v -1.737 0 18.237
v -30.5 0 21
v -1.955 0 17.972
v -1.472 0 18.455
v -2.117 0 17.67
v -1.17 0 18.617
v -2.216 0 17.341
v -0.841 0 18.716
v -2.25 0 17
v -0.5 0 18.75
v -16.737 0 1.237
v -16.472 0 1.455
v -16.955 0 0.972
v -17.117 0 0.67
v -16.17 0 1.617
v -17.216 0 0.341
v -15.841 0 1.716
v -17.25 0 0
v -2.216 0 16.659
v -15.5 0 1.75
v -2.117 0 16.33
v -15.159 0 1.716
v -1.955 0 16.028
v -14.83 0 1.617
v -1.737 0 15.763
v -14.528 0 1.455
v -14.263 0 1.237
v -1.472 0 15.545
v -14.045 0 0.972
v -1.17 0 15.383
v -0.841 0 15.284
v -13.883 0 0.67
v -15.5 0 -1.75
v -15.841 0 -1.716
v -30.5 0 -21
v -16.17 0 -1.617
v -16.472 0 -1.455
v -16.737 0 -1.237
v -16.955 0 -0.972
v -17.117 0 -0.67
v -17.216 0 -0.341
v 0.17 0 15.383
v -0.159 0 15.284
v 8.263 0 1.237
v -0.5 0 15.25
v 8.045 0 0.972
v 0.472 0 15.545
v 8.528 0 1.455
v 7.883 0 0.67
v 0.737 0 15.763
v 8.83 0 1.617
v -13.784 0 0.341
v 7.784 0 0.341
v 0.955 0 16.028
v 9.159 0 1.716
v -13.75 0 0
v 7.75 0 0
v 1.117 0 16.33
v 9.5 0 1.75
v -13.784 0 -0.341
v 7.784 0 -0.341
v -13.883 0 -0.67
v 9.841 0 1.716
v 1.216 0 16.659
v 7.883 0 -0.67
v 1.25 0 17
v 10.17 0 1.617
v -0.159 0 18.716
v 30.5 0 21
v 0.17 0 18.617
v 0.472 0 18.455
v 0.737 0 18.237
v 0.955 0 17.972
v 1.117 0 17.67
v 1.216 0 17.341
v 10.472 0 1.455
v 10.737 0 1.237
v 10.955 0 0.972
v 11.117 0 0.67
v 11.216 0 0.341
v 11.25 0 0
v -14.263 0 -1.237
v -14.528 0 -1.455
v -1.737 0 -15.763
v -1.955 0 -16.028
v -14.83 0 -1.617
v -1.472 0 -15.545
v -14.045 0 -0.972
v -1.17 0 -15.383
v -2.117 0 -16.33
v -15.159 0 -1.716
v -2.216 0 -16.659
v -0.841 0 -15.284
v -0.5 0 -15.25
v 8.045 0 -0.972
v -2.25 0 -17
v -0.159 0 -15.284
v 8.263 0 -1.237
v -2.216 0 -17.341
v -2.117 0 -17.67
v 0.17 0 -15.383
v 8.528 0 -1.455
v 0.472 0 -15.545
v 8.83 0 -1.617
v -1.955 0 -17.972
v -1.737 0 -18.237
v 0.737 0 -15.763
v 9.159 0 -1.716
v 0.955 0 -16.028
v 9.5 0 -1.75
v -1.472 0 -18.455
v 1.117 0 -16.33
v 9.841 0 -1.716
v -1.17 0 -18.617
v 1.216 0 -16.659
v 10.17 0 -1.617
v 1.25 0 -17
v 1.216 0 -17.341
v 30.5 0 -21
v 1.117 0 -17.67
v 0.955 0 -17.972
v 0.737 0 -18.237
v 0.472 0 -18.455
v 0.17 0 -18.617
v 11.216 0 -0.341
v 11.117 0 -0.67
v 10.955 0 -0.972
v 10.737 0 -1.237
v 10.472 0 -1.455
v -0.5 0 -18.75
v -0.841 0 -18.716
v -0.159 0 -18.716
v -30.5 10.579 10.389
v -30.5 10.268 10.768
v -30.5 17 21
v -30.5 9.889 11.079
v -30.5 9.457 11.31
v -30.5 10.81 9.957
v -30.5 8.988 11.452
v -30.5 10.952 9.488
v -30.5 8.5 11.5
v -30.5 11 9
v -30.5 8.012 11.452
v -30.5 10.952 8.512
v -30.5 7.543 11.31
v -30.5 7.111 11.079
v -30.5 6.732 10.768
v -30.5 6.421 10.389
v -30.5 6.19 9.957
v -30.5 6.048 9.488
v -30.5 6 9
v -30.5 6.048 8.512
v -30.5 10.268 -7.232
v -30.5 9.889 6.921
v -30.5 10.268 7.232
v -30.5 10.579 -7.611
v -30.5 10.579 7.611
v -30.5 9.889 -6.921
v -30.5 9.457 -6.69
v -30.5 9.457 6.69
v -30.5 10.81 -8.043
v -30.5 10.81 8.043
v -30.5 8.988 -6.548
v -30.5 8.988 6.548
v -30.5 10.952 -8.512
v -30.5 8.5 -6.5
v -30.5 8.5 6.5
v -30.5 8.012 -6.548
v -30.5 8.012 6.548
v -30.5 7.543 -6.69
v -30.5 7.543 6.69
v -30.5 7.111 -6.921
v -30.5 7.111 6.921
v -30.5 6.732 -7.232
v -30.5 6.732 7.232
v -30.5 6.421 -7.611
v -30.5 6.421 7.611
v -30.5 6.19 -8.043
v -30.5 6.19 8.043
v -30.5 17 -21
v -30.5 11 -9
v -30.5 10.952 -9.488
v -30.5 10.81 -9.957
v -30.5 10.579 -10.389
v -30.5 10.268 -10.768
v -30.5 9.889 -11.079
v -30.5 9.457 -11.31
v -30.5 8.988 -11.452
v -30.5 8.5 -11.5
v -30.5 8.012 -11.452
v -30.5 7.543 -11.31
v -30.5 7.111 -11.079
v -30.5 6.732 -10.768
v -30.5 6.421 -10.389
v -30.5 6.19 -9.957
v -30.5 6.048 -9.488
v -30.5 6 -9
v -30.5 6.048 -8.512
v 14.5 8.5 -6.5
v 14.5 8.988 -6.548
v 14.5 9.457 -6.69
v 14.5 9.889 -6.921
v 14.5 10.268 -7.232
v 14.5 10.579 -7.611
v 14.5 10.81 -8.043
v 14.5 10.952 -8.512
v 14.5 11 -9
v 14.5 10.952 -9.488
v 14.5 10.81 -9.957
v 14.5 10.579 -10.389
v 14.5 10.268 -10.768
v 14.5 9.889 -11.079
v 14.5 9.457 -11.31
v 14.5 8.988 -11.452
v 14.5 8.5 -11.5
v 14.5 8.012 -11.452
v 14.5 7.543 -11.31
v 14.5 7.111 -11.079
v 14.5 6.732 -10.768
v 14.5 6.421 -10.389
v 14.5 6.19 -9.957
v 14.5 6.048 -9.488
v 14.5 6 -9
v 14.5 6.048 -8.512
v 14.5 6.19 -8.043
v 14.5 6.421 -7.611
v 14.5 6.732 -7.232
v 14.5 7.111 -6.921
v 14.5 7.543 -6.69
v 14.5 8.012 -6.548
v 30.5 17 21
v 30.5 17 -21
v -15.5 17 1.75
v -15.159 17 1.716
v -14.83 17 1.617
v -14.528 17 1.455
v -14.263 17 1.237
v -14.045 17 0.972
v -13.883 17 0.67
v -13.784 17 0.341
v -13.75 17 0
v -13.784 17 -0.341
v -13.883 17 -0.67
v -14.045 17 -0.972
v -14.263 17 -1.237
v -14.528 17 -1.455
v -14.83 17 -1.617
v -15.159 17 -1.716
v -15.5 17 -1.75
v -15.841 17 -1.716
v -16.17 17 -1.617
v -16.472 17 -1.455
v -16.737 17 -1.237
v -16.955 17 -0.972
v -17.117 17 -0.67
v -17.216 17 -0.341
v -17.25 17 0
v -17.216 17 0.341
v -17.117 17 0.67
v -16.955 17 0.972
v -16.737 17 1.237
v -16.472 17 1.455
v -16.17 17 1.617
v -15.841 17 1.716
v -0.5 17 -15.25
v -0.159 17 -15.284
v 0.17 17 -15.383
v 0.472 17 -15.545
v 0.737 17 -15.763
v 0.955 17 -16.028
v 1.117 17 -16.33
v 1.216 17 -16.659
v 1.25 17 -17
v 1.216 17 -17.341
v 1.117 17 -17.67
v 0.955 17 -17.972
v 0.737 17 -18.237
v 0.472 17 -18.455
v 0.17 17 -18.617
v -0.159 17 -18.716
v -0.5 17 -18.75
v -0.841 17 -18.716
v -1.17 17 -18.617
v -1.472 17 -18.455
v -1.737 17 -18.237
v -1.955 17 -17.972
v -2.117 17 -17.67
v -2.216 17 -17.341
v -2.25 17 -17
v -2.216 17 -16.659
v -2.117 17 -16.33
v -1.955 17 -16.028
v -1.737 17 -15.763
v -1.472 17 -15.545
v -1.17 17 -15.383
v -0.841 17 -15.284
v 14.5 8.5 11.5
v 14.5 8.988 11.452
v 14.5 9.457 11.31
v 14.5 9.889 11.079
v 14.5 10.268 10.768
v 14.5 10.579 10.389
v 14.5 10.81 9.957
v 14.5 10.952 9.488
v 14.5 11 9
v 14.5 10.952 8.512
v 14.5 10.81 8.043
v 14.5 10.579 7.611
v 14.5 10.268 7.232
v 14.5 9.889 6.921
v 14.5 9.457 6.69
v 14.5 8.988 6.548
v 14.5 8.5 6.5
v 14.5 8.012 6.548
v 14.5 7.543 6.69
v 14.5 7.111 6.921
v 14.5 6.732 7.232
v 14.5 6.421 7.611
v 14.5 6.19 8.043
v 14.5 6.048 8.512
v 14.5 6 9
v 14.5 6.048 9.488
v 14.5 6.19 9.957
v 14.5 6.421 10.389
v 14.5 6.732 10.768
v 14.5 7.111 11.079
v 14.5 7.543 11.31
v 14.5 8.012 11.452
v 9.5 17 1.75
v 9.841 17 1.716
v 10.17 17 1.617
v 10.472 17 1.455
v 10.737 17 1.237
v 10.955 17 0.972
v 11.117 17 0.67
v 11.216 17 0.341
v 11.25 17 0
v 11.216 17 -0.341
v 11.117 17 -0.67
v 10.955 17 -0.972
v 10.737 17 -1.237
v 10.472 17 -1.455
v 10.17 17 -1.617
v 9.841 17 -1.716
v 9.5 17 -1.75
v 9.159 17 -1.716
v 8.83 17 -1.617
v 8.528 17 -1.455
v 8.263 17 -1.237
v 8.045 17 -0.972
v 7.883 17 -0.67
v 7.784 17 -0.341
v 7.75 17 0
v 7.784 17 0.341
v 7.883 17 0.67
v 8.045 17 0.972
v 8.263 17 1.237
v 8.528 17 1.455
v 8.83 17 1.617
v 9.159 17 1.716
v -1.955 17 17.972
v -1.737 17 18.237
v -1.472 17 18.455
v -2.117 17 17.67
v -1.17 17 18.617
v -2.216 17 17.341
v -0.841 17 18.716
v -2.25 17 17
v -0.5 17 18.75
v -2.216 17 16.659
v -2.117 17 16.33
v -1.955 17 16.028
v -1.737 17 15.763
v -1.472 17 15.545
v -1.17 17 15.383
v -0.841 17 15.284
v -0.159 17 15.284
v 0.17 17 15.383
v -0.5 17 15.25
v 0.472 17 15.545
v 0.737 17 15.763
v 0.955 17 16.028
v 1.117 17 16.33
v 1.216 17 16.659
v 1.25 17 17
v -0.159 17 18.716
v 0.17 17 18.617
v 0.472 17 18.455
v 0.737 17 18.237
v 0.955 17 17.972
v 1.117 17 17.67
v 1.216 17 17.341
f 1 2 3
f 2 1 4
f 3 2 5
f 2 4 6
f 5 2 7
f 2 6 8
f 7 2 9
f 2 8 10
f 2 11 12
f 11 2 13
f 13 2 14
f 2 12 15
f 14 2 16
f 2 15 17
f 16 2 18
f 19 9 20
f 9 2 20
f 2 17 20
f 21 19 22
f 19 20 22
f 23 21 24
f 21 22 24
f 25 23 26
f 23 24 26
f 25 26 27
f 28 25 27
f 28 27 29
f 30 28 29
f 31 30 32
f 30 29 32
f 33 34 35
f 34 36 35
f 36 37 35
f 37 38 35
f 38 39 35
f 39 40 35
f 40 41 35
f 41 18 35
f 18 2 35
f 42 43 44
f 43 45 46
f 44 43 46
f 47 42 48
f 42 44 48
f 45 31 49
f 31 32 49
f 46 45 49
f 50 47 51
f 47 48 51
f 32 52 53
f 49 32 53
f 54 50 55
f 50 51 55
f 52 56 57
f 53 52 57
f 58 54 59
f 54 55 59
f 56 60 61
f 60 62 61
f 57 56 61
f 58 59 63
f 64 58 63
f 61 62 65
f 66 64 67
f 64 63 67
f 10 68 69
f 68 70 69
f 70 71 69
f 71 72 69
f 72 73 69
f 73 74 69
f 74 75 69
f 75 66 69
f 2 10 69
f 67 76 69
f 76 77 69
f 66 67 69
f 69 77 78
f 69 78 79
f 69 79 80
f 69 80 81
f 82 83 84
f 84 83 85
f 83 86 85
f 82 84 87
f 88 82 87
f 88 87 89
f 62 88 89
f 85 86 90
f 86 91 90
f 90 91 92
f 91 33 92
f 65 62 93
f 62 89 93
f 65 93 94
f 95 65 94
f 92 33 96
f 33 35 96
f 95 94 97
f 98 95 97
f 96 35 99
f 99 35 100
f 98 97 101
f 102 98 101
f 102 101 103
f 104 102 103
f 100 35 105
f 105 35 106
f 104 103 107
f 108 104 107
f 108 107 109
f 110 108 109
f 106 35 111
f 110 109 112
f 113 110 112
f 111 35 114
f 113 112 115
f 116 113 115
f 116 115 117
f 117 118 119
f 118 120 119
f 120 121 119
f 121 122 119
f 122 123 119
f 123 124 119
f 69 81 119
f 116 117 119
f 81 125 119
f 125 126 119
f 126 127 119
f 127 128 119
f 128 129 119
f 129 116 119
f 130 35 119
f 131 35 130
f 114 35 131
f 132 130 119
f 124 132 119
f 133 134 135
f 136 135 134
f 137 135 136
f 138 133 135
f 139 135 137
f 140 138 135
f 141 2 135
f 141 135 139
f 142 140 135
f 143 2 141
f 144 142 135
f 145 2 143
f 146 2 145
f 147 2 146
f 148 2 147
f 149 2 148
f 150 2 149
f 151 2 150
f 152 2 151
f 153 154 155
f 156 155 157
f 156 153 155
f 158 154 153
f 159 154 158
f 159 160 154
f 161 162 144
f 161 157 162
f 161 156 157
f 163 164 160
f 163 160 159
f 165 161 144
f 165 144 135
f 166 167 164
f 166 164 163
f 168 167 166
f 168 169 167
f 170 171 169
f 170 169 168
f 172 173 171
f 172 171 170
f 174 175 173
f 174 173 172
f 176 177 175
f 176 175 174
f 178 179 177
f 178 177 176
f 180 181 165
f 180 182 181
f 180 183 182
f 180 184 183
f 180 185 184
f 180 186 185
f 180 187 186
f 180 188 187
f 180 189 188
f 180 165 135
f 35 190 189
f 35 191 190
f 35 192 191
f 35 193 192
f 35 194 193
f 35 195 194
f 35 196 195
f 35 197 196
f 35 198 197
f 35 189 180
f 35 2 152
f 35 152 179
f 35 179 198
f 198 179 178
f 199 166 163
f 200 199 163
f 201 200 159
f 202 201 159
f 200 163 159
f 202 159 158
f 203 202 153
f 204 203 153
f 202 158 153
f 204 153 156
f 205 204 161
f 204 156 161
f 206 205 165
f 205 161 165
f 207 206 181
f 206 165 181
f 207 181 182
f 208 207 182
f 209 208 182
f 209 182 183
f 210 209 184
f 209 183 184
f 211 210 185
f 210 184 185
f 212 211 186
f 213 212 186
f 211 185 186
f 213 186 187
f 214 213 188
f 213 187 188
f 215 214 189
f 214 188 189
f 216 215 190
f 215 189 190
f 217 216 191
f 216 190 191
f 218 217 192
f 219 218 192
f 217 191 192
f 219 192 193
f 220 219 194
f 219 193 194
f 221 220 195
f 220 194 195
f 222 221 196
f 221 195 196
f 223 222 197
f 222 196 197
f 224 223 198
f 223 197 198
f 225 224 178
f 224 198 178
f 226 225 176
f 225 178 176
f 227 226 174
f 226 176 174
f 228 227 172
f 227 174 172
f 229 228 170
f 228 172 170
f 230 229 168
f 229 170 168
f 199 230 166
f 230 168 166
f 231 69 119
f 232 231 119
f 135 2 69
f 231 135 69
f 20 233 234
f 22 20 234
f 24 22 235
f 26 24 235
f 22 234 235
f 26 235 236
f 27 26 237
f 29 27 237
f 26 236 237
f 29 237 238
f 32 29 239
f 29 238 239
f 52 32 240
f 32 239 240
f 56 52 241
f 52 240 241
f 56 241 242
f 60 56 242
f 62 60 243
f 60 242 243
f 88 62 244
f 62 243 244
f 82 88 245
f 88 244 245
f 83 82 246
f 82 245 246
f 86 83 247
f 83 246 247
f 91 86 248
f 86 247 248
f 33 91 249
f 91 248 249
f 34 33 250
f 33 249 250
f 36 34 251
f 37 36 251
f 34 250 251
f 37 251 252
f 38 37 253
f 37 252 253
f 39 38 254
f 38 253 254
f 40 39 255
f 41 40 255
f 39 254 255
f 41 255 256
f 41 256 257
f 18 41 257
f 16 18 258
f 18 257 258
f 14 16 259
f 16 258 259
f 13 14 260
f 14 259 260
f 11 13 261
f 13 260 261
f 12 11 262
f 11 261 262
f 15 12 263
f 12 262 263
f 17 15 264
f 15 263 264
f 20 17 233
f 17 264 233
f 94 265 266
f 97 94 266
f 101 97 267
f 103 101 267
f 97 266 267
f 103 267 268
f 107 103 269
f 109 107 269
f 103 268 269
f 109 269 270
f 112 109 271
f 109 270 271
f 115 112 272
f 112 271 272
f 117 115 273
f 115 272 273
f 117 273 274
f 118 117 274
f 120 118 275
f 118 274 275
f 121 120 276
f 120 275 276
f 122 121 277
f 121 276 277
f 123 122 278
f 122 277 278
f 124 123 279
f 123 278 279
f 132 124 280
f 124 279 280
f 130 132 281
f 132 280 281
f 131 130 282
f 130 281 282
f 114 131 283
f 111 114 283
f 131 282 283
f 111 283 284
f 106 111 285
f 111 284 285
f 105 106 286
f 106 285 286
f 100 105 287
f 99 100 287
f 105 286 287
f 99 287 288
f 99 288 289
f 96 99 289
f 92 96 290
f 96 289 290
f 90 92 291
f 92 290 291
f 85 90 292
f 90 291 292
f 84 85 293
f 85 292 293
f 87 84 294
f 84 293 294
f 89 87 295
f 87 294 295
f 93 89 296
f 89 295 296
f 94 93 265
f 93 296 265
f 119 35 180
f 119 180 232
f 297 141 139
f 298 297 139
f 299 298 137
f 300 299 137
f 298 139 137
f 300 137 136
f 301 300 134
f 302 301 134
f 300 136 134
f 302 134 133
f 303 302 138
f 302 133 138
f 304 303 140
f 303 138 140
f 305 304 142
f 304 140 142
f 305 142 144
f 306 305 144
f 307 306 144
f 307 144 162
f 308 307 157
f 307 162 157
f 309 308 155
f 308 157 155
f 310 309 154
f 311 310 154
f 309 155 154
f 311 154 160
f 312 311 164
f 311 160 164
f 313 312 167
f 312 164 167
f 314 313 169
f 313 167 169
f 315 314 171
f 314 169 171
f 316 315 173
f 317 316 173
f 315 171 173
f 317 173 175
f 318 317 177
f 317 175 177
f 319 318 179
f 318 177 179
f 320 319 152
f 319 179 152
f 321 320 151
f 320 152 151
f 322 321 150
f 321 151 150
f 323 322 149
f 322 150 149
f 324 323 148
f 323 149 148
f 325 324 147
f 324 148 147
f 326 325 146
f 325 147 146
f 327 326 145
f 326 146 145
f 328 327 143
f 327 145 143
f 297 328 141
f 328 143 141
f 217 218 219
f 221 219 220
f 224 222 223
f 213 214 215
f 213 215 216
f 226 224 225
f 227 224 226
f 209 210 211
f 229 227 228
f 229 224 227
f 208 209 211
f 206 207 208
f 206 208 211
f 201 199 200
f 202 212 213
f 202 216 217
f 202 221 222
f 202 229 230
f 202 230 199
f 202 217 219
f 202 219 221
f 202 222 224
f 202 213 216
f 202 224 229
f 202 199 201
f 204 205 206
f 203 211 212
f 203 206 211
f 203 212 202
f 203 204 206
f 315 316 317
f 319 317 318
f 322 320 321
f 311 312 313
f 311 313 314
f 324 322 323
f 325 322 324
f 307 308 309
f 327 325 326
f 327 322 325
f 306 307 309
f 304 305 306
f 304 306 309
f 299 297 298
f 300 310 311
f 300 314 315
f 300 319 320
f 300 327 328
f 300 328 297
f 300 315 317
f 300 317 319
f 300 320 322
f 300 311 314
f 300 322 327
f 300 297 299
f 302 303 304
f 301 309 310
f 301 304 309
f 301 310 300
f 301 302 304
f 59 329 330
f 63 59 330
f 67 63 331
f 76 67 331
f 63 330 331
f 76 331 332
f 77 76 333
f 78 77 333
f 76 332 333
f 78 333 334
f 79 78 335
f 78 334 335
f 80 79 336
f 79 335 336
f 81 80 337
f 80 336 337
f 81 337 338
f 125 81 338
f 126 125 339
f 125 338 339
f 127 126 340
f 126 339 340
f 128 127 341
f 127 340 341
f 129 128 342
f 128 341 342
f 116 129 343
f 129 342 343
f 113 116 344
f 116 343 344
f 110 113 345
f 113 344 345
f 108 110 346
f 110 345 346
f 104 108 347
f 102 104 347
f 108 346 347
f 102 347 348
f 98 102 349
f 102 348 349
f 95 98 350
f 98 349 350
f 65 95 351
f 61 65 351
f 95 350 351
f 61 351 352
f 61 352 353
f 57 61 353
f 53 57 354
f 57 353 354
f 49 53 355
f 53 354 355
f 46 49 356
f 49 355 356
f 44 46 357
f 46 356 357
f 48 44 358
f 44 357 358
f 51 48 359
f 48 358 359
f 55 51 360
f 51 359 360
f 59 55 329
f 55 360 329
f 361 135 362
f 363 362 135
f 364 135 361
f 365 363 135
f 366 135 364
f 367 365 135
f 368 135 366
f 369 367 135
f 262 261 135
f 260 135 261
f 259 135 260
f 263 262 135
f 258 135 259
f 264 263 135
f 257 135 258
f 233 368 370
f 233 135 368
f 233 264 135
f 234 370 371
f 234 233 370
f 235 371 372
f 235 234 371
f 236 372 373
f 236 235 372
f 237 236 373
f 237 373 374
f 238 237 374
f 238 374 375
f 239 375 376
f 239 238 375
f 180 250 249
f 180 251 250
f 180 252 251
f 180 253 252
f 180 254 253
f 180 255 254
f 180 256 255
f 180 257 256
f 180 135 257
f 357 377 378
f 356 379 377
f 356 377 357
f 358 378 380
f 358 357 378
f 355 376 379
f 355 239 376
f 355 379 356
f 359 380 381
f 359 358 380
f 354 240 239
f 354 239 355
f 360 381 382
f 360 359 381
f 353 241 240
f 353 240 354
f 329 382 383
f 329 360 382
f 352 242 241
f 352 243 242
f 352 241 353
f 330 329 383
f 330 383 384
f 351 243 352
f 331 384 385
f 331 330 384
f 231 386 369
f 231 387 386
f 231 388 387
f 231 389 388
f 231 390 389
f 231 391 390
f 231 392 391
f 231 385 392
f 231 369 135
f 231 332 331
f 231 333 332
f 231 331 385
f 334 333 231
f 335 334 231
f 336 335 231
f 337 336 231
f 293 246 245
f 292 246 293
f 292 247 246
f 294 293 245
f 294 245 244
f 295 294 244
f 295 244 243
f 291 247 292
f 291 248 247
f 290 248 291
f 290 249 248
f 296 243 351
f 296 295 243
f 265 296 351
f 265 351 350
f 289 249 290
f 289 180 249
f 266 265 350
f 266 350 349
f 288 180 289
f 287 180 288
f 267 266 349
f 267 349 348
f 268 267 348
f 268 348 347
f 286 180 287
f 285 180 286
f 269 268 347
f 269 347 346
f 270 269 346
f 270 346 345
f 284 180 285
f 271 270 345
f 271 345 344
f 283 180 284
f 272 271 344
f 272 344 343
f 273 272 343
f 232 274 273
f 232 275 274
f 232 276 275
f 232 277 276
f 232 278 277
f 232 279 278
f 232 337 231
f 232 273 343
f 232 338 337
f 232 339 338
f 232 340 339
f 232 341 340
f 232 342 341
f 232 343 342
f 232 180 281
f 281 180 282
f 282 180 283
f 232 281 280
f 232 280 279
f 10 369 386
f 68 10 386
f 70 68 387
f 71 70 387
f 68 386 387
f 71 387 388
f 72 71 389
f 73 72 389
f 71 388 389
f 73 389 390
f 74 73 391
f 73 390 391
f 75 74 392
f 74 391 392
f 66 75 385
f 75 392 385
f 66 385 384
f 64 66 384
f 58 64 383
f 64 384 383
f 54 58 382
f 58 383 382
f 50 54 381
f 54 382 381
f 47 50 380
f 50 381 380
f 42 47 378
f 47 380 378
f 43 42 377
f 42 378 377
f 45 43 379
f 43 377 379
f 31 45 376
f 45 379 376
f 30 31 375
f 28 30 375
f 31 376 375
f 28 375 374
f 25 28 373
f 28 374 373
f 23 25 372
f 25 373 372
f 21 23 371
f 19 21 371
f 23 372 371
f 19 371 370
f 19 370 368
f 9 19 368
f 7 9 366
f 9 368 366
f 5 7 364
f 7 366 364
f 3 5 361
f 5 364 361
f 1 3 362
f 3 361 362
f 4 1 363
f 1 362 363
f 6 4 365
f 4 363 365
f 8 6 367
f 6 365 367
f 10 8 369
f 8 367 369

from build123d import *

# Parameters (mm, degrees)
SKETCH_1_W          = 61
SKETCH_1_H          = 42
EXTRUDE_1_DEPTH     = 17
SKETCH_2_R          = 1.75
CUT_EXTRUDE_1_DEPTH = 17
SKETCH_3_R          = 2.5
CUT_EXTRUDE_2_DEPTH = 45


with BuildPart() as part:
    # 草图1 → 凸台-拉伸1 (new body)
    with BuildSketch(Plane(origin=(0, 0, 0), x_dir=(1, 0, 0), z_dir=(0, 1, 0))):
        Rectangle(SKETCH_1_W, SKETCH_1_H)
    extrude(amount=EXTRUDE_1_DEPTH)

    # 草图2 → 切除-拉伸1 (cut)
    with BuildSketch(Plane(origin=(0, 17, 0), x_dir=(1, 0, 0), z_dir=(0, 1, 0))):
        with Locations(Location((-0.5, 17, 0), (0, 0, 270))):
            Circle(SKETCH_2_R)
        with Locations(Location((-0.5, -17, 0), (0, 0, 270))):
            Circle(SKETCH_2_R)
        with Locations(Location((-15.5, 0, 0), (0, 0, 270))):
            Circle(SKETCH_2_R)
        with Locations(Location((9.5, 0, 0), (0, 0, 270))):
            Circle(SKETCH_2_R)
    extrude(amount=-CUT_EXTRUDE_1_DEPTH, mode=Mode.SUBTRACT)

    # 草图3 → 切除-拉伸2 (cut)
    with BuildSketch(Plane.ZY.offset(30.5)):
        with Locations((-9, 8.5)):
            Circle(SKETCH_3_R)
        with Locations((9, 8.5)):
            Circle(SKETCH_3_R)
    extrude(amount=-CUT_EXTRUDE_2_DEPTH, mode=Mode.SUBTRACT)


solid = part.part
